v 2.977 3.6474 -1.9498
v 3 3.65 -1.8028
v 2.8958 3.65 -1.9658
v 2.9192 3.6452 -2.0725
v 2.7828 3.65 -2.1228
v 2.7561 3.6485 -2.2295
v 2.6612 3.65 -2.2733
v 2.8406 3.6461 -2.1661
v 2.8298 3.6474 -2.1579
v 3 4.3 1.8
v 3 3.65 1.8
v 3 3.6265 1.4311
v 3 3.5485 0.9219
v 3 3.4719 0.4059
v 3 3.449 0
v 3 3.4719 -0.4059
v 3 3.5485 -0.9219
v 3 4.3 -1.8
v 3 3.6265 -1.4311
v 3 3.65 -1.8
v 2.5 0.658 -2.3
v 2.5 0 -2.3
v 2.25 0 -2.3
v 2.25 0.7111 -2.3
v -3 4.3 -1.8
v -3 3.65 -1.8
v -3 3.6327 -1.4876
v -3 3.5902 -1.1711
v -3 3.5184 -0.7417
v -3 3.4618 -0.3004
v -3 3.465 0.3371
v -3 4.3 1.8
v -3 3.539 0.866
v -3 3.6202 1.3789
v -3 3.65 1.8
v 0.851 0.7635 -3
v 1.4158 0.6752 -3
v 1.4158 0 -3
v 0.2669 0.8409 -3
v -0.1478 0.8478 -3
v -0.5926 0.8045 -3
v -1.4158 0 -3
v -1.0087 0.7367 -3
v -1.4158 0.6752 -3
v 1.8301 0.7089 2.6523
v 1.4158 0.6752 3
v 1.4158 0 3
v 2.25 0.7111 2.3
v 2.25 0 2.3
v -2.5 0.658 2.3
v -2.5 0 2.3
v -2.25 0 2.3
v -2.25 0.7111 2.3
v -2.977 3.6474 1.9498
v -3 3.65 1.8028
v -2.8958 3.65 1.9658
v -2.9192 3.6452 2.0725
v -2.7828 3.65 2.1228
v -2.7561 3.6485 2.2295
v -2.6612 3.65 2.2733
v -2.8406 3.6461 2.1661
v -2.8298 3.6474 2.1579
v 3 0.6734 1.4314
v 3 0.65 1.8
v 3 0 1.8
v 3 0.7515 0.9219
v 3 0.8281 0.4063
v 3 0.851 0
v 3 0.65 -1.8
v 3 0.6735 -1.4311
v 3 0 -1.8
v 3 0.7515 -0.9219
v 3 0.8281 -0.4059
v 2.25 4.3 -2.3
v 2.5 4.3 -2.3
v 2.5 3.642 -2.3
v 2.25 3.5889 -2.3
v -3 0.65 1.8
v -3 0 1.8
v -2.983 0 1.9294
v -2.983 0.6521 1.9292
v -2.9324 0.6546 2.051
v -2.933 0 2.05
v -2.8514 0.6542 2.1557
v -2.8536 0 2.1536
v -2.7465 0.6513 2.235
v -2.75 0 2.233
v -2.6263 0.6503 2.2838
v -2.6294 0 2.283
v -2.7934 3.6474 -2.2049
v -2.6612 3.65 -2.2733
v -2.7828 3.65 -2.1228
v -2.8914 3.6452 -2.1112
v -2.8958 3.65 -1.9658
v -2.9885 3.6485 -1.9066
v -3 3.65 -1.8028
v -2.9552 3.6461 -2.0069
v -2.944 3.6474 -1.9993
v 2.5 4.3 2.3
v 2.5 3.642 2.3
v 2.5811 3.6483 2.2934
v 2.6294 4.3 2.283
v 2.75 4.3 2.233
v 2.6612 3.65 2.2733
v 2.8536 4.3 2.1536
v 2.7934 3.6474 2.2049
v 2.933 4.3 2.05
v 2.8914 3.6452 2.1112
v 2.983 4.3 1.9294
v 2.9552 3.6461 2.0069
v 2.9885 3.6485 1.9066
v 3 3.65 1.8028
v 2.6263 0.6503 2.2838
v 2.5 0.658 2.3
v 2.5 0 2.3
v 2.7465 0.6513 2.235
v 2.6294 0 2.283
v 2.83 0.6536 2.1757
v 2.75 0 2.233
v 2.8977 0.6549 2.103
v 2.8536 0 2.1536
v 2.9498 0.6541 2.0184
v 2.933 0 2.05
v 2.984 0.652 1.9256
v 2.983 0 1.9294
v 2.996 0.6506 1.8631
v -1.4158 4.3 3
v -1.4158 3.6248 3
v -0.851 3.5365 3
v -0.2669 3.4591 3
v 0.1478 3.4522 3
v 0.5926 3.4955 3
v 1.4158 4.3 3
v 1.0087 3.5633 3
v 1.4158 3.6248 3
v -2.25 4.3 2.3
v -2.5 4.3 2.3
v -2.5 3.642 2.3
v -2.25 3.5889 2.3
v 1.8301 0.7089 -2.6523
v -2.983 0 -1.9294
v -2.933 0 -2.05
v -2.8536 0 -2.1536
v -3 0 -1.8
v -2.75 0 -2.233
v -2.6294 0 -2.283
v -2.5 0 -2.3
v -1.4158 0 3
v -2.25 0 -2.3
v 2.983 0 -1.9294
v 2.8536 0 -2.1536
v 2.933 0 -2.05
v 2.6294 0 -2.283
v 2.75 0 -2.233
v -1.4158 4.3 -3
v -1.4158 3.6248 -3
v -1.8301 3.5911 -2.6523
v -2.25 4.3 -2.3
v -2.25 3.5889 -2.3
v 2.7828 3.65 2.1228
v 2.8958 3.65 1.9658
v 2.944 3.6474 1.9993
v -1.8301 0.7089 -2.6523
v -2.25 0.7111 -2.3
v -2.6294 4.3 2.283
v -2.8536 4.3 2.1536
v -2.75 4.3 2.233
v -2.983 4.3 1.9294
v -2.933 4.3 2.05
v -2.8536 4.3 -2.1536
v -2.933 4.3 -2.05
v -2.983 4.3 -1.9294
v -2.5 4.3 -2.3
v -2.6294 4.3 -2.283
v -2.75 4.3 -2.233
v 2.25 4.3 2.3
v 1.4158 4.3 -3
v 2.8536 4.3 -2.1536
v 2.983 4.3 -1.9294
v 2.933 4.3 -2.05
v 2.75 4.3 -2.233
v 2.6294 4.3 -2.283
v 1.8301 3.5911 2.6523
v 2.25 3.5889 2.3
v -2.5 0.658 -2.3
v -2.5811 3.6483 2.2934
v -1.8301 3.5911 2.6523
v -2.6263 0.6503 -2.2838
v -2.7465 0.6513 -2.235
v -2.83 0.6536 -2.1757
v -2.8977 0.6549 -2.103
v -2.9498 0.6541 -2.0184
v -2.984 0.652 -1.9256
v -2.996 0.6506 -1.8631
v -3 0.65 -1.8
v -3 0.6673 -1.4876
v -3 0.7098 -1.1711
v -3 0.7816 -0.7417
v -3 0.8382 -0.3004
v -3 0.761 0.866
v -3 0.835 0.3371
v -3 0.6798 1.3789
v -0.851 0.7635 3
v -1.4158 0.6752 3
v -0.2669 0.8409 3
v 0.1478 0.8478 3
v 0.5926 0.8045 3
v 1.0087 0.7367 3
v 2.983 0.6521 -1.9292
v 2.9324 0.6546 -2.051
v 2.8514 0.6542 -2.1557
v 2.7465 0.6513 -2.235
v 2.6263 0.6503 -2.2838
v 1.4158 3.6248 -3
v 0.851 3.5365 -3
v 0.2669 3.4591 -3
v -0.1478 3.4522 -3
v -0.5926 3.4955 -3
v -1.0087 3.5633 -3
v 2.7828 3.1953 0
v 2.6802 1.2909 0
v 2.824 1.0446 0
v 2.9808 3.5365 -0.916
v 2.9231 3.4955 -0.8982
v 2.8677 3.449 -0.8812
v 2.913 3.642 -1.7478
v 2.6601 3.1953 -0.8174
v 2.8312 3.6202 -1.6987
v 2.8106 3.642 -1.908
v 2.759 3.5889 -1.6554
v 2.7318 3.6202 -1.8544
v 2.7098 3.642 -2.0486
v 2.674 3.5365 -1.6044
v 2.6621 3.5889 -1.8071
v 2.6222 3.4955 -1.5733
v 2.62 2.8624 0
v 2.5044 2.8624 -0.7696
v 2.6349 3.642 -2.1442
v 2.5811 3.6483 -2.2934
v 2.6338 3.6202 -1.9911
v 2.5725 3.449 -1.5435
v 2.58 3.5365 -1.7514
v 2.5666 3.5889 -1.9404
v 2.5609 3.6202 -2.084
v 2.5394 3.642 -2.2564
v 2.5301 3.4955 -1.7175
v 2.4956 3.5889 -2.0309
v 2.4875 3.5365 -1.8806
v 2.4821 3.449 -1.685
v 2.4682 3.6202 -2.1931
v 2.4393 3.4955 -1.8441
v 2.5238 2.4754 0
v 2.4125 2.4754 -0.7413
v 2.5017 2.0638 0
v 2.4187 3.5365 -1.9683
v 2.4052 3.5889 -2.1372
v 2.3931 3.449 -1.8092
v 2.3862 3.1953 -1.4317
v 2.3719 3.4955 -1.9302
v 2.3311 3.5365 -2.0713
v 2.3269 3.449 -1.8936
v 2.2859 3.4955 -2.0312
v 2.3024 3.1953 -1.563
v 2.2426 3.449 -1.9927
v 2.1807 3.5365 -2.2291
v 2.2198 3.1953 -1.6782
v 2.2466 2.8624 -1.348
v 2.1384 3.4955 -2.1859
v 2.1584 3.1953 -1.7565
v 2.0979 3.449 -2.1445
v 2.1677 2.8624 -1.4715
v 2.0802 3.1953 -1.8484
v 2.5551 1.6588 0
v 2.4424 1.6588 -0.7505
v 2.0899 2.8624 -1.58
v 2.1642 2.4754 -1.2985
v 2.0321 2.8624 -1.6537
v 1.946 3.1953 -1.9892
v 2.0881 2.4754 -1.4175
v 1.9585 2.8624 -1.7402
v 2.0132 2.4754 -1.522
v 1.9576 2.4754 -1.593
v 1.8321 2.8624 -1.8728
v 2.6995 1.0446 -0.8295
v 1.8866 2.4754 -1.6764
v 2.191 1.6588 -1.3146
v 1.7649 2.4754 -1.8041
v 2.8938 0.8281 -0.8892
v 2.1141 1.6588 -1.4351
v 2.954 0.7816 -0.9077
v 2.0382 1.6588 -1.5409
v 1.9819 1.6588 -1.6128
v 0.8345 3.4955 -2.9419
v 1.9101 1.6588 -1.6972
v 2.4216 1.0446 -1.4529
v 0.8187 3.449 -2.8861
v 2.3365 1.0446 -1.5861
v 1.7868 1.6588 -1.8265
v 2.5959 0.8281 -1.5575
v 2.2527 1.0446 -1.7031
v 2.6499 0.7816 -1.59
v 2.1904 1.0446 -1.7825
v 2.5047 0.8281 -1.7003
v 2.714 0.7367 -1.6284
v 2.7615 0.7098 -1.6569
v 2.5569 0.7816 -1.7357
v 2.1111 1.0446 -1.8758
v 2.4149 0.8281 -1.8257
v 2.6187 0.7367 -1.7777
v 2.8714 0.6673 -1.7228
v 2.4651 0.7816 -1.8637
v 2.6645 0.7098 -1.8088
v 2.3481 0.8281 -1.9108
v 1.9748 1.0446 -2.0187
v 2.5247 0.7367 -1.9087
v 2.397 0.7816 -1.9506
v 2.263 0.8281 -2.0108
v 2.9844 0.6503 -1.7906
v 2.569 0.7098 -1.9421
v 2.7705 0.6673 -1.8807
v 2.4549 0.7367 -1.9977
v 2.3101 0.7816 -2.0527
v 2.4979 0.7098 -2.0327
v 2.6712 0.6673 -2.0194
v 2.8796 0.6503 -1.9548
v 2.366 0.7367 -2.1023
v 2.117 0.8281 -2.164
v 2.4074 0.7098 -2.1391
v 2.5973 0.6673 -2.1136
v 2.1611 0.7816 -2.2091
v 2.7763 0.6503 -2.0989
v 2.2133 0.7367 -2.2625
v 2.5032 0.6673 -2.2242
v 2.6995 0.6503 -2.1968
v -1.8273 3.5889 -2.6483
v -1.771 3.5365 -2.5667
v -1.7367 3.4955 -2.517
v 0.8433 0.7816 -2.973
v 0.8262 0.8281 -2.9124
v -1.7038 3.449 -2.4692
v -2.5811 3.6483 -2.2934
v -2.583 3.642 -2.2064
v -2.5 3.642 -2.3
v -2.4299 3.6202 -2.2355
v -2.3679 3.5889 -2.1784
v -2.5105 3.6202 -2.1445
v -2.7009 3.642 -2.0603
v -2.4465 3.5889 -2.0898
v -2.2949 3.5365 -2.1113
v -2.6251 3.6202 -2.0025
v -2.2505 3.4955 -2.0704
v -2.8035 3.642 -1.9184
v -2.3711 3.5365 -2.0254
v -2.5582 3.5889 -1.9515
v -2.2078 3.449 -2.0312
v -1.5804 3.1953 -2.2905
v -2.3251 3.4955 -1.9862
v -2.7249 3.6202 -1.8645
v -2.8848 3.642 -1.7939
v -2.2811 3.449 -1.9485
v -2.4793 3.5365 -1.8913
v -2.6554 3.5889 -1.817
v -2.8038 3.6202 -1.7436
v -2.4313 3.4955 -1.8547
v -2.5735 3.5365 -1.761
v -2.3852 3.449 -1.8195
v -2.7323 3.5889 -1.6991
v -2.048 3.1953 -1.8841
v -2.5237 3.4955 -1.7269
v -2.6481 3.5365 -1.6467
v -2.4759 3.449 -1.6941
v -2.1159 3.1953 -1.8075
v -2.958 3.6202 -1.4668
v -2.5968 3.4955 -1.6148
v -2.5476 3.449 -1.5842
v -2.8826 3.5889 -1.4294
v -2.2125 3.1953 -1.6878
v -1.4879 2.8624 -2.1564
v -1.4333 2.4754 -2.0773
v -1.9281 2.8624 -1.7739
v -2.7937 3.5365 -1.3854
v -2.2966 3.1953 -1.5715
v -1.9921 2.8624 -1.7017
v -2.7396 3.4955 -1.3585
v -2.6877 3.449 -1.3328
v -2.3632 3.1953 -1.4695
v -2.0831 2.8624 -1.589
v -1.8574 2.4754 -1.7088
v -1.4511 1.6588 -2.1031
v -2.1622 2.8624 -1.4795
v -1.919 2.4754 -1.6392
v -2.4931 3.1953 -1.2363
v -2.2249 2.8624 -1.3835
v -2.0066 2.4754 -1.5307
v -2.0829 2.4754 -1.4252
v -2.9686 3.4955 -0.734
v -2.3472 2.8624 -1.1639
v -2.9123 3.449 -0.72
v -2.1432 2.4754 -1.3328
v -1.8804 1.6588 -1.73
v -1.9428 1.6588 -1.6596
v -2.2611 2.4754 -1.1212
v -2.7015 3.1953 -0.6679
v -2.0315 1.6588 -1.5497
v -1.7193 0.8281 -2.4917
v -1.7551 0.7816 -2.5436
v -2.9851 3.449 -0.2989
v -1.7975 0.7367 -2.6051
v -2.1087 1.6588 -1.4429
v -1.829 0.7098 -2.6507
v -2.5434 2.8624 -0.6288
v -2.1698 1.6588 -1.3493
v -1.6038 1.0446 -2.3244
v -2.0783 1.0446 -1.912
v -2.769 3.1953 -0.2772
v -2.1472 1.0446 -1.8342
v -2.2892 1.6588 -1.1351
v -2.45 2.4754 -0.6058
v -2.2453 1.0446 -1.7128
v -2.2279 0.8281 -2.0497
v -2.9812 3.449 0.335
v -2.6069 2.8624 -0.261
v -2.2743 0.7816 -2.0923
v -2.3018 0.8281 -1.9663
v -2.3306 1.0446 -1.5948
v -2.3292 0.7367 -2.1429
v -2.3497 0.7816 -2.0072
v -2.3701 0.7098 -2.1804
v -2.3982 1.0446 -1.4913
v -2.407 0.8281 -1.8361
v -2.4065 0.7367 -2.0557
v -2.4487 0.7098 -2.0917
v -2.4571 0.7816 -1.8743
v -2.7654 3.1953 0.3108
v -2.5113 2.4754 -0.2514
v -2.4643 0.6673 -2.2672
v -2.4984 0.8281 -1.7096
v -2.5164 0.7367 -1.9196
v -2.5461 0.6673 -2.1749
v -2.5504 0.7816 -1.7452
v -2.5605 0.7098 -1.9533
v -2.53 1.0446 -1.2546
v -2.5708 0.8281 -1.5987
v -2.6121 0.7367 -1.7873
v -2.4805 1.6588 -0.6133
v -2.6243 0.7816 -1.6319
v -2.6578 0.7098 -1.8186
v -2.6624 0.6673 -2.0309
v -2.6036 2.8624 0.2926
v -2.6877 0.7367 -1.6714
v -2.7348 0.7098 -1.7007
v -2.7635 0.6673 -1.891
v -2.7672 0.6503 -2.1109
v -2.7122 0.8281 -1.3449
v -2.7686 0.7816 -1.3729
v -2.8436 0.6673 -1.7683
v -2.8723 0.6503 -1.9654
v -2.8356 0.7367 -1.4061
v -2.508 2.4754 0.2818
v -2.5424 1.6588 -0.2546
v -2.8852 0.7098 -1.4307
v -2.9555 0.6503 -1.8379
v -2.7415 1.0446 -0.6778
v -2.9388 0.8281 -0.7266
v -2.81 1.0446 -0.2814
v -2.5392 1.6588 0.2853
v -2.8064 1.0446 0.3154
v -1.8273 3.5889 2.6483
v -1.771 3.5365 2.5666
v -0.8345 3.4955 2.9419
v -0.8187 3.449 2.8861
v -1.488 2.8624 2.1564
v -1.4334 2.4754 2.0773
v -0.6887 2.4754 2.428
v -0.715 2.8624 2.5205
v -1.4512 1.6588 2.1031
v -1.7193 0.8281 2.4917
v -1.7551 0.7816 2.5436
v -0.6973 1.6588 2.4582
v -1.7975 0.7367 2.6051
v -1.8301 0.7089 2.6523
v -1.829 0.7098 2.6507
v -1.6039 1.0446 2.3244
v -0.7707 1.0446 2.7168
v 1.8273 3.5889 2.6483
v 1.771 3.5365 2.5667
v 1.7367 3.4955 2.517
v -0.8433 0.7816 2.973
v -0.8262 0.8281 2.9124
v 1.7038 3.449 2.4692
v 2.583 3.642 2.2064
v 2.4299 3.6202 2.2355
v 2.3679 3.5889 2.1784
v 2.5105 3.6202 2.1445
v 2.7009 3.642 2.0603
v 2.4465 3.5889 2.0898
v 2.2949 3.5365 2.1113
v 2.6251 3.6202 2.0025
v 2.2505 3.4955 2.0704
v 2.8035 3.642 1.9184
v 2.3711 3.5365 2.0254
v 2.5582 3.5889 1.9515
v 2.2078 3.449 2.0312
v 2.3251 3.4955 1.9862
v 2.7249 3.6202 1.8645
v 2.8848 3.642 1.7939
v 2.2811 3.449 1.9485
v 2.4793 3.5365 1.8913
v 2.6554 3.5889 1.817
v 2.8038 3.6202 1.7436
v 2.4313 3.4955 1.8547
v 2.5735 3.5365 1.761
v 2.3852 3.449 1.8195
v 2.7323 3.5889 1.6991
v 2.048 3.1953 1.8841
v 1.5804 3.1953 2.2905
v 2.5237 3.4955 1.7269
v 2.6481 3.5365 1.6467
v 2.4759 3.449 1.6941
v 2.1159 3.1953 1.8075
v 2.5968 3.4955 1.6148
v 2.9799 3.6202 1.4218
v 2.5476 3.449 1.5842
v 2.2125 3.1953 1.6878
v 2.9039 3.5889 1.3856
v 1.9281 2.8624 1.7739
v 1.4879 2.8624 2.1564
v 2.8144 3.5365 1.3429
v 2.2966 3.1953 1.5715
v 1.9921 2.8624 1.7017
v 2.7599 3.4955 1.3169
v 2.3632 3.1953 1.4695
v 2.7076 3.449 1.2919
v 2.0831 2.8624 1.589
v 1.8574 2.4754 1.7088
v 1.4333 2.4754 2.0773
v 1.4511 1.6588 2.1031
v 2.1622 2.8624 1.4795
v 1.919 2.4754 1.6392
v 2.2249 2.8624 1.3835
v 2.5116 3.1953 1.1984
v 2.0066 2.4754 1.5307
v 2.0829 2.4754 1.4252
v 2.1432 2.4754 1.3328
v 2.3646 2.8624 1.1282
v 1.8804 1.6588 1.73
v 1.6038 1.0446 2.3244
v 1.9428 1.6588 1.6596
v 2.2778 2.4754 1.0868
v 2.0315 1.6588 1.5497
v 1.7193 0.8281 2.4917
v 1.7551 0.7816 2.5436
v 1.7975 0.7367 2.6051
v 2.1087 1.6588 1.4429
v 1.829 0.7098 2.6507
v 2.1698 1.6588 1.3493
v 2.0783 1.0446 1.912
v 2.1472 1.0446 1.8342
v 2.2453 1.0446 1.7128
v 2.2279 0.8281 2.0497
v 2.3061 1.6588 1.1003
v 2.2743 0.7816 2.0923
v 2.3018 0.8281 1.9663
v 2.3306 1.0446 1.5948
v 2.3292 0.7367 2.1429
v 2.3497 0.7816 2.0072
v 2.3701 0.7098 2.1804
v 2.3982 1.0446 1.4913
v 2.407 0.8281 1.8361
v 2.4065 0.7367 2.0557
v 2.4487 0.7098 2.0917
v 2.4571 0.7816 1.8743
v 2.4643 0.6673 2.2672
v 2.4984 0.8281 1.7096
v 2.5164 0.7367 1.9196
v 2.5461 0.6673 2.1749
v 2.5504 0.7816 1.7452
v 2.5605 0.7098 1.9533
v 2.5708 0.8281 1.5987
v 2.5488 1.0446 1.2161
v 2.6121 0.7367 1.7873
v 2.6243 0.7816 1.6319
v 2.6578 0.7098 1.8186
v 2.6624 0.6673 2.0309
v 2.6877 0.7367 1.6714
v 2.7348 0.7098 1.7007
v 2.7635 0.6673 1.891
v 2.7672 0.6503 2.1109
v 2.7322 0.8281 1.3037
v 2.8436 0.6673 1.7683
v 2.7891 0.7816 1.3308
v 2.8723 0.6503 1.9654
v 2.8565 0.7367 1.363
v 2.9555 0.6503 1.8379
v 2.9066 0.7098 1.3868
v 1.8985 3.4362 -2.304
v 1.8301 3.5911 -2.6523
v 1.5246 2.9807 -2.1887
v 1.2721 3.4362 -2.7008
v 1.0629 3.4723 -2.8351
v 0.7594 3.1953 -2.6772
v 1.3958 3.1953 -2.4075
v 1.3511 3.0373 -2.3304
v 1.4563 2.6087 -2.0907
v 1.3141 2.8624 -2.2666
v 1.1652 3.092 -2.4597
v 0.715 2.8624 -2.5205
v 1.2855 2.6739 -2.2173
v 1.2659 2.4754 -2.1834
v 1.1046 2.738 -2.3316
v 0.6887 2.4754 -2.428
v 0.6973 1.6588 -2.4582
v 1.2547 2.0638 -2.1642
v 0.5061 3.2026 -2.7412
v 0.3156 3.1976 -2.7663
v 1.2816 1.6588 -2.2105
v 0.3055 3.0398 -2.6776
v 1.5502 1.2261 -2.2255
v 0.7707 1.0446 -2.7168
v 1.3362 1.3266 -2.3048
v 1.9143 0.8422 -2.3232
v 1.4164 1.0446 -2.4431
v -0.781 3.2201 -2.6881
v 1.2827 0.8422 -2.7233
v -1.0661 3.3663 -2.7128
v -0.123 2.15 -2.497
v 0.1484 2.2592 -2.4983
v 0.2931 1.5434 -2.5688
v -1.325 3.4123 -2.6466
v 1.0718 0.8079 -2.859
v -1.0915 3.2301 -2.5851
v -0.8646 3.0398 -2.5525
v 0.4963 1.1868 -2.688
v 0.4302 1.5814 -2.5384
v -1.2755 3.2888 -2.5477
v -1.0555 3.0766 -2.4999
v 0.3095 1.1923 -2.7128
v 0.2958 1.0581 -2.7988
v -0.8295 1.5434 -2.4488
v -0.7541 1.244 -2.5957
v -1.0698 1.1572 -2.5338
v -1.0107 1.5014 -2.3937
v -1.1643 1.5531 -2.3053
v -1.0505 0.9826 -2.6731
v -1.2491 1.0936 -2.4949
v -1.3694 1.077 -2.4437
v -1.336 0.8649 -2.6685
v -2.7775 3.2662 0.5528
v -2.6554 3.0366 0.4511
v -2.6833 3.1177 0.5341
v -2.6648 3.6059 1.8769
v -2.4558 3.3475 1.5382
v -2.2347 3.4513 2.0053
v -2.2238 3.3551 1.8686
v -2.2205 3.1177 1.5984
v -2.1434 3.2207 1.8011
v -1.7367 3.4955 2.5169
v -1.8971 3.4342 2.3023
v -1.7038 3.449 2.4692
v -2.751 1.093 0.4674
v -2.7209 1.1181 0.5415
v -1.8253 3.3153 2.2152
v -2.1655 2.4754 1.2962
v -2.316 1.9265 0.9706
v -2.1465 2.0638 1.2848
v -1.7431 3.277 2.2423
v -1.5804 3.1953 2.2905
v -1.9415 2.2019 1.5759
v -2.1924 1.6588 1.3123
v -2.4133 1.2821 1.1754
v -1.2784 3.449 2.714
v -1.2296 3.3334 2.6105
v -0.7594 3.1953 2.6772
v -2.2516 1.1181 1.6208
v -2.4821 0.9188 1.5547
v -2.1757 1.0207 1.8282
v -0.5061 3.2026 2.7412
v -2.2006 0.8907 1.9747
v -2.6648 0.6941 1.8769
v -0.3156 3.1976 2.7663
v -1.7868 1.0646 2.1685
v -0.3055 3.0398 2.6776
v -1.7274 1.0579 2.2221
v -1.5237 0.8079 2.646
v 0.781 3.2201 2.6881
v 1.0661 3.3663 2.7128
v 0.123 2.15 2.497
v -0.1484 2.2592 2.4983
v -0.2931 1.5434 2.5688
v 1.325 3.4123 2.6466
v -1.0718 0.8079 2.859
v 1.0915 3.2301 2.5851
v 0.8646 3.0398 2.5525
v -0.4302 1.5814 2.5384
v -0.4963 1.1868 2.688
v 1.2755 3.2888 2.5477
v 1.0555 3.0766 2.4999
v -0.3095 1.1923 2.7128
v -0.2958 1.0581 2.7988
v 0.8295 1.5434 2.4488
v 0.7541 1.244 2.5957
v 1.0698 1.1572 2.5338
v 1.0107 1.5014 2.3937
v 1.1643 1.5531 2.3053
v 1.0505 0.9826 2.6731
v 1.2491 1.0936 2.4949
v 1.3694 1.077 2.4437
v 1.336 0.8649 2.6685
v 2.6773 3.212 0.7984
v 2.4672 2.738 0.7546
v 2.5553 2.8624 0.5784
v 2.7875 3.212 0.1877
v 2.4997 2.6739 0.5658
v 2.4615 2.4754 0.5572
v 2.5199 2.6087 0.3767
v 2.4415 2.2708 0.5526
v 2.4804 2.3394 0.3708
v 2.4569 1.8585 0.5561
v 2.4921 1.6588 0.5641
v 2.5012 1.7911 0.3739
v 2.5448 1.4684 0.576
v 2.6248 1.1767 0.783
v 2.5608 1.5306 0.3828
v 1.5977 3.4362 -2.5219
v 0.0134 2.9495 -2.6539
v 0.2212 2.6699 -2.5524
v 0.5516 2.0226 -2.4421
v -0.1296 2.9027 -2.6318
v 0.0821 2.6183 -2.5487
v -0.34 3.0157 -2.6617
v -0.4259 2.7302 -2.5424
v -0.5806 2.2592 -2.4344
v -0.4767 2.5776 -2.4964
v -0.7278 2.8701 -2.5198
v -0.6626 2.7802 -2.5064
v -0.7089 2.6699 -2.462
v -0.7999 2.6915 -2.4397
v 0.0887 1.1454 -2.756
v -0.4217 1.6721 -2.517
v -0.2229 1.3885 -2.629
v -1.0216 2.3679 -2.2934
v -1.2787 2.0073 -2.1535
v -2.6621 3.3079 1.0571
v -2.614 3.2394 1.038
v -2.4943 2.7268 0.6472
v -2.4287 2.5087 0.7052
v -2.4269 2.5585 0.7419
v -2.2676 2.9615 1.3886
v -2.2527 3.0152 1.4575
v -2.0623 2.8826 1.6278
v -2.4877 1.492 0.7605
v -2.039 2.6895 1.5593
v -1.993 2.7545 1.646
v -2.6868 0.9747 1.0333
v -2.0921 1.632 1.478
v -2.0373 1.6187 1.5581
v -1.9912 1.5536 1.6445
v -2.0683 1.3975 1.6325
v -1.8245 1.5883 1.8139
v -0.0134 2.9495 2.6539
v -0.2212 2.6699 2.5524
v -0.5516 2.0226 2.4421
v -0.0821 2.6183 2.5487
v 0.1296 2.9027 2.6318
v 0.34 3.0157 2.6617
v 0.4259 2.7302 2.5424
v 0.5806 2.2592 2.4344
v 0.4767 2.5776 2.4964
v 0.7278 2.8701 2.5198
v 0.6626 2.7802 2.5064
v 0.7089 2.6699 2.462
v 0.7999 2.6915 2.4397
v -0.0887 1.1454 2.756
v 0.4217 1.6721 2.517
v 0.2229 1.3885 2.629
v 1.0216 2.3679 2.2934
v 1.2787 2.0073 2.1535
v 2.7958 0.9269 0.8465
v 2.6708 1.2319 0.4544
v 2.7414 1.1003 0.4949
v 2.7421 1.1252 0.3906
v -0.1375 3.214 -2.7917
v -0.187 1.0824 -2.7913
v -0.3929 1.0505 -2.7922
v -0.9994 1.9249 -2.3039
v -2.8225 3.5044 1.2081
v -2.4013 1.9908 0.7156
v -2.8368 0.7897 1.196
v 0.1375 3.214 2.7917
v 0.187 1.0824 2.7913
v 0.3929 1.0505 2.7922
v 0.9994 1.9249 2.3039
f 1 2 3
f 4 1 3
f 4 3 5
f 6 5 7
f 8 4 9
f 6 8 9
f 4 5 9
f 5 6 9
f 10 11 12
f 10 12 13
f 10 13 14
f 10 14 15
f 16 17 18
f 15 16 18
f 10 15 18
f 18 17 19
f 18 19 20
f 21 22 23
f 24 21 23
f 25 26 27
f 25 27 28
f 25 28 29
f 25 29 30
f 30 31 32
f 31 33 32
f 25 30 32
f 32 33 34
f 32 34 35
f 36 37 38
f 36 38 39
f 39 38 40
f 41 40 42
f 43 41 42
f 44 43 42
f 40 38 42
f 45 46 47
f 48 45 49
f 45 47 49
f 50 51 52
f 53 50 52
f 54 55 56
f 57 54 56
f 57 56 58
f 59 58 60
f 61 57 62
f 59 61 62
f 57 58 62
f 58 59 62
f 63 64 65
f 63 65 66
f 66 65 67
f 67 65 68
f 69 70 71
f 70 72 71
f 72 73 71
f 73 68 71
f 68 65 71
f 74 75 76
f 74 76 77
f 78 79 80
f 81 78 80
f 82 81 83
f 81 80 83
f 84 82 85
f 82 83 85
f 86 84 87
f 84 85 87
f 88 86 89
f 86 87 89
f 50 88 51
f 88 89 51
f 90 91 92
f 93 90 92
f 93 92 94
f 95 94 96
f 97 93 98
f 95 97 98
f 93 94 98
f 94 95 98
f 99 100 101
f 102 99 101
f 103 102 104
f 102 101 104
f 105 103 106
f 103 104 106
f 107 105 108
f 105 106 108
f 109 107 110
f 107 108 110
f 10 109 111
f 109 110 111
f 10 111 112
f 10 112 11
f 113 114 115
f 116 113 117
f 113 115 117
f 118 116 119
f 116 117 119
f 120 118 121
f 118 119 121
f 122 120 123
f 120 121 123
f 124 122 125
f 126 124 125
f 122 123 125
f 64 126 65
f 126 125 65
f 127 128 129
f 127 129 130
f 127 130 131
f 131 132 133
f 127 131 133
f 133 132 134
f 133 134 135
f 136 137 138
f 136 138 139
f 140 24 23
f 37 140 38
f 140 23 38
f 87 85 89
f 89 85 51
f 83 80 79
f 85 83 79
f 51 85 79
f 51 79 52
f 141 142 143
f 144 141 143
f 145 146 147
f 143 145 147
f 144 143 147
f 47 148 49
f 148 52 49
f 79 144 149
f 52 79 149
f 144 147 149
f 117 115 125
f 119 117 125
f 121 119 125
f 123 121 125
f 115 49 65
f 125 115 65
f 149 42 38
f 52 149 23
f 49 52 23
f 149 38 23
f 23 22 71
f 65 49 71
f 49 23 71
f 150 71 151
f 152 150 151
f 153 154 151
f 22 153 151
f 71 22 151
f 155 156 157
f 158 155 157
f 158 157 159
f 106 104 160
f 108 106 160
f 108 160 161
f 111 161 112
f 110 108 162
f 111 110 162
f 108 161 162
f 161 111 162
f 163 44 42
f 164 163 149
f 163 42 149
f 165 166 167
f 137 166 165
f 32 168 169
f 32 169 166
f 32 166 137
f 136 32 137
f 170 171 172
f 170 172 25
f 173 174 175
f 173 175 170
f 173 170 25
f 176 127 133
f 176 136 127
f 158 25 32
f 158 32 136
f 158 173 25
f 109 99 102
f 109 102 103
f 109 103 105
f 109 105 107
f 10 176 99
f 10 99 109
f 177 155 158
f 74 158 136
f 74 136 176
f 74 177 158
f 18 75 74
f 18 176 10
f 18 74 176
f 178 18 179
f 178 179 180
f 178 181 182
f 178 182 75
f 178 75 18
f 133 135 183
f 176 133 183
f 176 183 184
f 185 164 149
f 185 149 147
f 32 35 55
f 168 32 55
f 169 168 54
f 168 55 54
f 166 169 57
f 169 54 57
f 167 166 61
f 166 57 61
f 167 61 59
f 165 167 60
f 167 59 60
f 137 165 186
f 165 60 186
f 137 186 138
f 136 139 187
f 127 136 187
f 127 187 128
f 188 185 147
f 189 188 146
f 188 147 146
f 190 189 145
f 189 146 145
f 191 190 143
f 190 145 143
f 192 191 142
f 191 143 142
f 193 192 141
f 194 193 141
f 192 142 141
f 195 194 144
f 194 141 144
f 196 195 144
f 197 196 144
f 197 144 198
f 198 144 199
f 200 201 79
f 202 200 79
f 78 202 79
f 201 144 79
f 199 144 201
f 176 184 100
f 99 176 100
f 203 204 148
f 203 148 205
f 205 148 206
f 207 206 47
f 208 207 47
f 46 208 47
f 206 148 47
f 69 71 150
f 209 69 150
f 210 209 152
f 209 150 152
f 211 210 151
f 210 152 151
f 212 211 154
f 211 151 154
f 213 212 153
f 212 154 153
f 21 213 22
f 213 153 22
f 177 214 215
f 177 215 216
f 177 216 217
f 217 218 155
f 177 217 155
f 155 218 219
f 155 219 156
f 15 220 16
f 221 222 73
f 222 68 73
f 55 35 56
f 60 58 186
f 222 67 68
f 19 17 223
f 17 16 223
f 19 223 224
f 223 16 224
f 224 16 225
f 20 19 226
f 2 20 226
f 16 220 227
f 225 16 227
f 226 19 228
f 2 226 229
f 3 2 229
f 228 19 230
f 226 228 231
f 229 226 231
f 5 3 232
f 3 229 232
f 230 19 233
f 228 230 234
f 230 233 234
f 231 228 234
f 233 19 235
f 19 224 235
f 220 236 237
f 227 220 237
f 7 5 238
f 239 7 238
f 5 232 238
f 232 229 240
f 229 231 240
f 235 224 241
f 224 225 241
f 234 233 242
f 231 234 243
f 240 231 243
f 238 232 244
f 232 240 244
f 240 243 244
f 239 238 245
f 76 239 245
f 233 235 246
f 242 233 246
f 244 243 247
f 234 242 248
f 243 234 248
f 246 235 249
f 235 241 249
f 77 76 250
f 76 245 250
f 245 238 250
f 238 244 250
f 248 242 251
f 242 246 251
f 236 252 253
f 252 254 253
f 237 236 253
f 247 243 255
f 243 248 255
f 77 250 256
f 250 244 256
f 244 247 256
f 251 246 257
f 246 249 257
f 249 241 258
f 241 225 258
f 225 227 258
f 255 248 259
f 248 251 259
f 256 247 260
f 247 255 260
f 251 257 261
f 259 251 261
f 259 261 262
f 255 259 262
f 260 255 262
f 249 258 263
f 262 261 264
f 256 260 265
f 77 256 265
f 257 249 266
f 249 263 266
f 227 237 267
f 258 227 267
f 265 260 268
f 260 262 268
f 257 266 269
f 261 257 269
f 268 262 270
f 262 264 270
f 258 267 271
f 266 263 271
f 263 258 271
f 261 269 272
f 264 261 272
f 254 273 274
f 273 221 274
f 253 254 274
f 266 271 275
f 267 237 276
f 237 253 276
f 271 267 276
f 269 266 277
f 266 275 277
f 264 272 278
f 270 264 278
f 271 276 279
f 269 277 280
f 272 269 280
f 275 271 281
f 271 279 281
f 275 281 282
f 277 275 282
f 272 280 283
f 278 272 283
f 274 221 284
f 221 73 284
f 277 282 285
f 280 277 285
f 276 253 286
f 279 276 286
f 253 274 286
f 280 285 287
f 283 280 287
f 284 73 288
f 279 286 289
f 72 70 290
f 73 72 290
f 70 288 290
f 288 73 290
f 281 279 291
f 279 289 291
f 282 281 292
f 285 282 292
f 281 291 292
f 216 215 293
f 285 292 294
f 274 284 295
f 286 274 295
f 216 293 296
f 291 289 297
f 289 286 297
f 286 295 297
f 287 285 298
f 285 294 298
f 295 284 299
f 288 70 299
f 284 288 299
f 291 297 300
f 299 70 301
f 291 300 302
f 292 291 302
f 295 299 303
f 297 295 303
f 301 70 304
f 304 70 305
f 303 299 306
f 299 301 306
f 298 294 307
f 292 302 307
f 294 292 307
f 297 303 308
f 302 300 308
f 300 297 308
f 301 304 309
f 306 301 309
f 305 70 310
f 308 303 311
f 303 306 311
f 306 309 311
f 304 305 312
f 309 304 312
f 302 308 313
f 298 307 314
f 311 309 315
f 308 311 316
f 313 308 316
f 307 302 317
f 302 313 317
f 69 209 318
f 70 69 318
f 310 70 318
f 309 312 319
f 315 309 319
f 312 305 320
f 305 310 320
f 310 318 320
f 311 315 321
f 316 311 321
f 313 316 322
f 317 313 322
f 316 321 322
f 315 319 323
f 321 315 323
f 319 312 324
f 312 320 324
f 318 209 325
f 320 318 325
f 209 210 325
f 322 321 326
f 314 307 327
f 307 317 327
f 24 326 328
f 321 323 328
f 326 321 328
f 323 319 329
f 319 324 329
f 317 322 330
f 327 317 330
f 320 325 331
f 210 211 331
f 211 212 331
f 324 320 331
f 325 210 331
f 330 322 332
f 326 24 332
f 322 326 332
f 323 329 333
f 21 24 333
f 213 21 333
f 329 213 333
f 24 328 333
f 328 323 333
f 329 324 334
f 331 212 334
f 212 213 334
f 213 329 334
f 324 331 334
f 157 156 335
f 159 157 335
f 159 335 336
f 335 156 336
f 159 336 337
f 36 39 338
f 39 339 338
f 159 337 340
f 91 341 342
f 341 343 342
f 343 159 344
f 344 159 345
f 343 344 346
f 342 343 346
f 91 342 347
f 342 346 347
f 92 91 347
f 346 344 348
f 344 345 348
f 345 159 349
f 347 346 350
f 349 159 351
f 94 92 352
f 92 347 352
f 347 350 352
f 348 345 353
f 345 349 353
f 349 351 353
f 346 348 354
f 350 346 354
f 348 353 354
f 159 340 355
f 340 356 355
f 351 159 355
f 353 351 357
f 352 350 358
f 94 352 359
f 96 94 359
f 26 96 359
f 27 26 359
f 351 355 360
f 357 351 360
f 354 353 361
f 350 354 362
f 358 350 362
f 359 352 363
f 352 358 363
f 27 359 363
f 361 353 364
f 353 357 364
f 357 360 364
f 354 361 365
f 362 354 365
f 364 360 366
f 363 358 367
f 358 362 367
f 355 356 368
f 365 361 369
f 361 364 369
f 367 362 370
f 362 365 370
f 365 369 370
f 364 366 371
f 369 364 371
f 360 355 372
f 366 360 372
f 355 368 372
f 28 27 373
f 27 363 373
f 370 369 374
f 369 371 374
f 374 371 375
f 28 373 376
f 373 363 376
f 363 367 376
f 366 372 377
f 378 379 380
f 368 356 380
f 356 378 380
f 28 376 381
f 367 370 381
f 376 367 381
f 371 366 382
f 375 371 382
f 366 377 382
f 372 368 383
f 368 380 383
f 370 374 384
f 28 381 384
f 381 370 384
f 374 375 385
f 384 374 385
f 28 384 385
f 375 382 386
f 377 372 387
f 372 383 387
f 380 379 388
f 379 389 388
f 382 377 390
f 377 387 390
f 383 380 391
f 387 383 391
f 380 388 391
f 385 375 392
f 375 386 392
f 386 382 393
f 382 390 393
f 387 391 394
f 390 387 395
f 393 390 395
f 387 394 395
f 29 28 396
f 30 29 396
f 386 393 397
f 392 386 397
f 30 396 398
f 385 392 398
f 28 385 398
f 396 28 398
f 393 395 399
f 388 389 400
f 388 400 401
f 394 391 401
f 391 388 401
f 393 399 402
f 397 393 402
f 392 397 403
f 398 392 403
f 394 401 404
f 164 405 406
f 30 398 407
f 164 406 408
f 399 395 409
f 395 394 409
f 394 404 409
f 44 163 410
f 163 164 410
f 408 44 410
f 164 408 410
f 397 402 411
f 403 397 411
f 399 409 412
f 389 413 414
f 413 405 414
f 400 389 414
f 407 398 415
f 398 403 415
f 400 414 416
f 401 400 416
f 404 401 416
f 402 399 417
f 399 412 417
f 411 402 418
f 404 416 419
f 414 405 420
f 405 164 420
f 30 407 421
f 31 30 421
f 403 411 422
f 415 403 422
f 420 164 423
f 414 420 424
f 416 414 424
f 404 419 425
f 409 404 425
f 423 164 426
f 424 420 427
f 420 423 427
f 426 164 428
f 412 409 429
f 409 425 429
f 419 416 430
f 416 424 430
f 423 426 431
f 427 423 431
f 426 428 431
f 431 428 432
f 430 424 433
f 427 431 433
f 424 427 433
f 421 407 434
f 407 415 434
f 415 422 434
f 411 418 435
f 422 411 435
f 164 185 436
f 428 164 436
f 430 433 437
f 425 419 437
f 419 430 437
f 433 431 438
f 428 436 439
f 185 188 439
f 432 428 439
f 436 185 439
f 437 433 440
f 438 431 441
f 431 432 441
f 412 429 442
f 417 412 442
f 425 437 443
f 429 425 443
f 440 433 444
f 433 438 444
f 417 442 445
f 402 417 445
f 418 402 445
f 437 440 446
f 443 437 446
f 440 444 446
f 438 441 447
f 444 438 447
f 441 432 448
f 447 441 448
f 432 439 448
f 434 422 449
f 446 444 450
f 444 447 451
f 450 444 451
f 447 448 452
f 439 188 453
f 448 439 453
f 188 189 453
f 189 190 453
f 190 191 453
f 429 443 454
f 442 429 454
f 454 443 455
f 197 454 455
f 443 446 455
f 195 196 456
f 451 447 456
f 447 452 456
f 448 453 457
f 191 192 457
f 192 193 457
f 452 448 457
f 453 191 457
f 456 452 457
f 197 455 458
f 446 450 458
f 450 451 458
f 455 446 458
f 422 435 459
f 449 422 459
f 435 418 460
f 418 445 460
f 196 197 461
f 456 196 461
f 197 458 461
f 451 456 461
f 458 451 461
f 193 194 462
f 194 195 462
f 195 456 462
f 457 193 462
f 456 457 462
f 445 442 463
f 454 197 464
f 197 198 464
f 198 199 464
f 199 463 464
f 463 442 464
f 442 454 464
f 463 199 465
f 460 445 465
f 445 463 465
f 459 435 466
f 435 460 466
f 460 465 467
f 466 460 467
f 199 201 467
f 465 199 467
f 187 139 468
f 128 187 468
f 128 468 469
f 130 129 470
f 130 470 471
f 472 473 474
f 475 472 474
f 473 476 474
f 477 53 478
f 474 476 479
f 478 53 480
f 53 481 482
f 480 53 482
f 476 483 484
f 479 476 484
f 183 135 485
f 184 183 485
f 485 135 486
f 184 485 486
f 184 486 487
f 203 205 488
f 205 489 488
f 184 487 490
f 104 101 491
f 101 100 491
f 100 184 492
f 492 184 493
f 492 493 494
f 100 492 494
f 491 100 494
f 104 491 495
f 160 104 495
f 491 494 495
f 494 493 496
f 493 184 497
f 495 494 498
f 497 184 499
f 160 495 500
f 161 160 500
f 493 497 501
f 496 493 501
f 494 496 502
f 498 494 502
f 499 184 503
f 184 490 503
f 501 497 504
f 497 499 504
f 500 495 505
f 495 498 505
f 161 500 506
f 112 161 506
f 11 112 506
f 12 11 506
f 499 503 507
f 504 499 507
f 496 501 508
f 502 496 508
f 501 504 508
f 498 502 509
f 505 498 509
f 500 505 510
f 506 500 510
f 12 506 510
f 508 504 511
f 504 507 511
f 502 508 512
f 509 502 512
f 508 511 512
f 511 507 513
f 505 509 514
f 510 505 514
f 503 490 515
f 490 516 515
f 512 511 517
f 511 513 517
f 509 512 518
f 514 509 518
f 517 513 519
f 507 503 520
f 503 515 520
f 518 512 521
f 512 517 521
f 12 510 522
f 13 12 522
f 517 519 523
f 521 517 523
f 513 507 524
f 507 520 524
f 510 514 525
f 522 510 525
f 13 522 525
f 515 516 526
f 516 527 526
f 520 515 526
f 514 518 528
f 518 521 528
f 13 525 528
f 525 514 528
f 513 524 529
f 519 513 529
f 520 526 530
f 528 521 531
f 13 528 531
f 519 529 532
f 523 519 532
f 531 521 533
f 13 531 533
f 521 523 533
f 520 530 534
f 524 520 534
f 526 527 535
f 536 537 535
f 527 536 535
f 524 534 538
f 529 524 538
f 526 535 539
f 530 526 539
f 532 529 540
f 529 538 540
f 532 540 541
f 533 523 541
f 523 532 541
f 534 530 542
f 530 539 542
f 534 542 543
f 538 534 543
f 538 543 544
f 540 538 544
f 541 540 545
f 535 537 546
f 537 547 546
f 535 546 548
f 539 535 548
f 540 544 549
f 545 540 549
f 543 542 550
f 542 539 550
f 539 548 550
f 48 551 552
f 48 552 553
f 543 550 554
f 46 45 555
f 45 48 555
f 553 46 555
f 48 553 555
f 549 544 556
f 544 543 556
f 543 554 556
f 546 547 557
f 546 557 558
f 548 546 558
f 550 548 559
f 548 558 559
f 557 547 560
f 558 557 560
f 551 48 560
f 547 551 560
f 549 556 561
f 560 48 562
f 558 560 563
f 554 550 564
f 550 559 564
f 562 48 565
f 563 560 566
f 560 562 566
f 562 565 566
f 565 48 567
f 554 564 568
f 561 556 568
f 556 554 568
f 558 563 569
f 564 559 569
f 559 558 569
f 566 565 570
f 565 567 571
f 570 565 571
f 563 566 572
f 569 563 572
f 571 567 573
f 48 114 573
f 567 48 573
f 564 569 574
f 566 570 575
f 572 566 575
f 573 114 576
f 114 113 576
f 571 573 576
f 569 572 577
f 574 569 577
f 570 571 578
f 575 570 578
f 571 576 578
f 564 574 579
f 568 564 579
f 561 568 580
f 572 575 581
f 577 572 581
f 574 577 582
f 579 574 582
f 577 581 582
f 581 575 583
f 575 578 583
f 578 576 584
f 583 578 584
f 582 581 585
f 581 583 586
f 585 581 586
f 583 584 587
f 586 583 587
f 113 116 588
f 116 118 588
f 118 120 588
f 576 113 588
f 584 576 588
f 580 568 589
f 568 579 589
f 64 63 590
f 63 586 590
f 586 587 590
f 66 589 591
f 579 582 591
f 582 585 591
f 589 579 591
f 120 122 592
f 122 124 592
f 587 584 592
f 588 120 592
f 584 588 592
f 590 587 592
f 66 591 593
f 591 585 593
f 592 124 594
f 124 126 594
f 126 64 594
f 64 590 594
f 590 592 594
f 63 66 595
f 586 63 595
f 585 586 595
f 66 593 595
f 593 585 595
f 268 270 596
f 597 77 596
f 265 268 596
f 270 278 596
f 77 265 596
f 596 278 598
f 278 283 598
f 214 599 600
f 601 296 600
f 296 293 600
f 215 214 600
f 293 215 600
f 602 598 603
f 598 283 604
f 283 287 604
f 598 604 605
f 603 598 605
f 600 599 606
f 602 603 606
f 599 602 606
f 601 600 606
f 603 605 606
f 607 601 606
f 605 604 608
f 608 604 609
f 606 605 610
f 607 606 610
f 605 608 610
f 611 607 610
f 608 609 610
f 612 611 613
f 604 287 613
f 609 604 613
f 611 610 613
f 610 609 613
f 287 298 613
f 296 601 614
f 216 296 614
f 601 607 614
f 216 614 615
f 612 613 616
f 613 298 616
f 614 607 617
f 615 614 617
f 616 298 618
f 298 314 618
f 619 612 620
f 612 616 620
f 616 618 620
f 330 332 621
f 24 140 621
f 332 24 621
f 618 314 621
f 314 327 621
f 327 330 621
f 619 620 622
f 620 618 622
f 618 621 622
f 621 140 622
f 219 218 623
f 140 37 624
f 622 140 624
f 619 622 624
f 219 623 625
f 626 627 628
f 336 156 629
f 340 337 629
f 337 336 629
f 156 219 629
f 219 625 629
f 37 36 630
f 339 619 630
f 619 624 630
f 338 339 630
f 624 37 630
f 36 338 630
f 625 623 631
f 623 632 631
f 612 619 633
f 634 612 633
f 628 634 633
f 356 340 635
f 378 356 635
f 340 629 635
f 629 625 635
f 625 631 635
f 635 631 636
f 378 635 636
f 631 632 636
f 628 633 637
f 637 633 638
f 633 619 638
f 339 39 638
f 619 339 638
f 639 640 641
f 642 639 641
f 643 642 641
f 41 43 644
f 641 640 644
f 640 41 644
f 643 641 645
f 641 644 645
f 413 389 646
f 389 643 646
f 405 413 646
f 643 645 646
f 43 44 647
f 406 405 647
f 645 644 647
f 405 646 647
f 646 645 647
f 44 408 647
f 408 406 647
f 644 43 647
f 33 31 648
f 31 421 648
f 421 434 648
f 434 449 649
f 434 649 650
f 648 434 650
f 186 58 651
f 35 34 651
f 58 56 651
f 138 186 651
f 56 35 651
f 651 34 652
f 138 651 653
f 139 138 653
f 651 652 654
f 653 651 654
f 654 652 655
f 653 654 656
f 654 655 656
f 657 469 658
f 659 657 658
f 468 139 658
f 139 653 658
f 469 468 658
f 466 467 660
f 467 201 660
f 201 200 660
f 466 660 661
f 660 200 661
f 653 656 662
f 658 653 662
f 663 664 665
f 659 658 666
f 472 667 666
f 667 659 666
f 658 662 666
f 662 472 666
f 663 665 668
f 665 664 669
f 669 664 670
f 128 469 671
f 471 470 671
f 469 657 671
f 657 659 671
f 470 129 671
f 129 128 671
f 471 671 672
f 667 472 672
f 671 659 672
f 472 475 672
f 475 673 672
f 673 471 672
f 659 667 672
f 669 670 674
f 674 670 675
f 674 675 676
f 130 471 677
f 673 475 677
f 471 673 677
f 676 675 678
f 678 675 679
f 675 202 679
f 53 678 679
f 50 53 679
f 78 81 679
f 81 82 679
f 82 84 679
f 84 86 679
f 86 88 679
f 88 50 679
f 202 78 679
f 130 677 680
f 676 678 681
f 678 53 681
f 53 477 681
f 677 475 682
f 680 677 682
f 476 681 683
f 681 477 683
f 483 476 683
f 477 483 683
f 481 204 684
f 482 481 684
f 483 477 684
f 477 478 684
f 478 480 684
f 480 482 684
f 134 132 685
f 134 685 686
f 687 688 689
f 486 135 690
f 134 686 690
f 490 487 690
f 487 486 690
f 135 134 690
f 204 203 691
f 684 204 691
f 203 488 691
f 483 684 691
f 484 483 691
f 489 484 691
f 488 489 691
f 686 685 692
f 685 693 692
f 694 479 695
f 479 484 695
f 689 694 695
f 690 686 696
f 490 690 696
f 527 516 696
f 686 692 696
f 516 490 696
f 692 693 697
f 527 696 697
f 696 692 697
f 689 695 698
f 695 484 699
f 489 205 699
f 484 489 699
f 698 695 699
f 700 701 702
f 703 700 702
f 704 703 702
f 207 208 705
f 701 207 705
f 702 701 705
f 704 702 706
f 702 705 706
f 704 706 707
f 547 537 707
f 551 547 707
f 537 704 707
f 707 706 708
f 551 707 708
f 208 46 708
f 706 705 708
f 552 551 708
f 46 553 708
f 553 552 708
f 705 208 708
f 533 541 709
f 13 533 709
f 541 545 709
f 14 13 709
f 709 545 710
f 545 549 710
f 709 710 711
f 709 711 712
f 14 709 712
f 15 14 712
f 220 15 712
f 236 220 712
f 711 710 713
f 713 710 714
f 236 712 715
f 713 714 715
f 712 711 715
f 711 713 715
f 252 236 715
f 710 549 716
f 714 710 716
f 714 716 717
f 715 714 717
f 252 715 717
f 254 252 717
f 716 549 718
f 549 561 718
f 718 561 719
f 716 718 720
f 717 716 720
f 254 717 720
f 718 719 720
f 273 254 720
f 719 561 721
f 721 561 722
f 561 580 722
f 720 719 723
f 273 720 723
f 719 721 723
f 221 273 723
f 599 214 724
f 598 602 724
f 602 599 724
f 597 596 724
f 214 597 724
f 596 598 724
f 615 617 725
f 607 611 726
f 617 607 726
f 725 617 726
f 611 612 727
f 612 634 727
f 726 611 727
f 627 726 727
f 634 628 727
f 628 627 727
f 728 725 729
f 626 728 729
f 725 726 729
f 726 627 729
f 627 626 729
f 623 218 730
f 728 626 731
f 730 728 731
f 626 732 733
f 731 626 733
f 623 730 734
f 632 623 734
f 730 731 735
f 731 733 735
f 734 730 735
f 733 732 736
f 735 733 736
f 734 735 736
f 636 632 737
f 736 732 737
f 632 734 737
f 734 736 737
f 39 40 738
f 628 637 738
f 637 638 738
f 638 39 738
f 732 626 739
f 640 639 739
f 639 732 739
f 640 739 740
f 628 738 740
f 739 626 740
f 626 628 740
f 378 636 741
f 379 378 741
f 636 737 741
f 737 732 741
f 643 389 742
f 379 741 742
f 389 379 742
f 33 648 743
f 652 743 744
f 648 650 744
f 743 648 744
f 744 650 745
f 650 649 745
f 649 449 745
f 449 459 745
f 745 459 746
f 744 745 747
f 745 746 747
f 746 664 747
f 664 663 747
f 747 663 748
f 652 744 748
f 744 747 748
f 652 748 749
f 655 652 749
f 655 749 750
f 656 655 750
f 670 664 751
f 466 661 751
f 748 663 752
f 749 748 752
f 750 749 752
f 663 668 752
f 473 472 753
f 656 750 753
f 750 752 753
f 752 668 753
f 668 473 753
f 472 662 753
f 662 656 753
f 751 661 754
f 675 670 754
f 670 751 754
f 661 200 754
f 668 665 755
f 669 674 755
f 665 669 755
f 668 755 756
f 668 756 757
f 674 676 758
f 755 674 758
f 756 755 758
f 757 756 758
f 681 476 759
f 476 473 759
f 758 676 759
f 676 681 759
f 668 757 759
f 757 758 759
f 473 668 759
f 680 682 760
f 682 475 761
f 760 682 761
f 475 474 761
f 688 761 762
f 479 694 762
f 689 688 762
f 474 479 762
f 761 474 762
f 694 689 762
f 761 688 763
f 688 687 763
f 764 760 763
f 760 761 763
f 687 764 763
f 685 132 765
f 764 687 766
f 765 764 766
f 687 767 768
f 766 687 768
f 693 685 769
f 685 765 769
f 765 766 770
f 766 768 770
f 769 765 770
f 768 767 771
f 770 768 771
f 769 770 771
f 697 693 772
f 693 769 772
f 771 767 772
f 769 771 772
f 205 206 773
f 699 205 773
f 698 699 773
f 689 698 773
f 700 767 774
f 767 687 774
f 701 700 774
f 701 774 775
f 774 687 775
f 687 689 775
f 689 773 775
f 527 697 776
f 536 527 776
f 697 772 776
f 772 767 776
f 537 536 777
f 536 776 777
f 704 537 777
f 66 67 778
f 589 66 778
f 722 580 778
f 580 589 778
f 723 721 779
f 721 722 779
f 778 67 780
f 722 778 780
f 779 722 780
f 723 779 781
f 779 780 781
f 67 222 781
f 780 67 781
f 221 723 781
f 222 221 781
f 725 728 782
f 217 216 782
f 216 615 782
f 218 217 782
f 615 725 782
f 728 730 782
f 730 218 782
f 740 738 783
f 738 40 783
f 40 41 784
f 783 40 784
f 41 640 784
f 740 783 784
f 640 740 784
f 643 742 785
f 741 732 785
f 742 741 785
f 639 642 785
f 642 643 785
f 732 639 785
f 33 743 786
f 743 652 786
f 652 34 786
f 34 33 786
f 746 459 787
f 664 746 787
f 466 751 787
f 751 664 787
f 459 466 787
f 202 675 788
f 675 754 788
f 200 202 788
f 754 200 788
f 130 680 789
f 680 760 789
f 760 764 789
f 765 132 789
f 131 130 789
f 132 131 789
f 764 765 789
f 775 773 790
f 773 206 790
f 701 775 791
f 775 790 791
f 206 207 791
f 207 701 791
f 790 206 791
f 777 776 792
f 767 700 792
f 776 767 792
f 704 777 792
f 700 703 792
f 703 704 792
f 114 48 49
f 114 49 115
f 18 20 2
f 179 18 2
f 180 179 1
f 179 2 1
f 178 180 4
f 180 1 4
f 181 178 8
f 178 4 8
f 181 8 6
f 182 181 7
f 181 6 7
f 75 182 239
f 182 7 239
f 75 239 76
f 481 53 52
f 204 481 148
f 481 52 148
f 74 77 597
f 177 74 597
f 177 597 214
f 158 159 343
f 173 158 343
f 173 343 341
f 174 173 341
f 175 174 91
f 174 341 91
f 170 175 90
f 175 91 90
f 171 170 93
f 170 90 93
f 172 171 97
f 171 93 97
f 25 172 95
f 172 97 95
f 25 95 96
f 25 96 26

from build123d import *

# Parameters (mm, degrees)
BOSS_EXTRUDE1_DEPTH = 4.3
SKETCH2_RX          = 1.5
SKETCH2_RY          = 1


with BuildPart() as part:
    # Sketch1 → Boss-Extrude1 (new body)
    with BuildSketch(Plane(origin=(0, 0, 0), x_dir=(1, 0, 0), z_dir=(0, 1, 0))):
        with BuildLine():
            Line((-1.415772485, -3), (1.415772485, -3))
            Line((1.415772485, -3), (2.25, -2.3))
            Line((2.25, -2.3), (2.5, -2.3))
            ThreePointArc((2.5, -2.3), (2.853553391, -2.153553391), (3, -1.8))
            Line((3, -1.8), (3, 1.8))
            ThreePointArc((3, 1.8), (2.853553391, 2.153553391), (2.5, 2.3))
            Line((2.5, 2.3), (2.25, 2.3))
            Line((2.25, 2.3), (1.415772485, 3))
            Line((1.415772485, 3), (-1.415772485, 3))
            Line((-1.415772485, 3), (-2.25, 2.3))
            Line((-2.25, 2.3), (-2.5, 2.3))
            ThreePointArc((-2.5, 2.3), (-2.853553391, 2.153553391), (-3, 1.8))
            Line((-3, 1.8), (-3, -1.8))
            ThreePointArc((-3, -1.8), (-2.853553391, -2.153553391), (-2.5, -2.3))
            Line((-2.5, -2.3), (-2.25, -2.3))
            Line((-2.25, -2.3), (-1.415772485, -3))
        make_face()
    extrude(amount=BOSS_EXTRUDE1_DEPTH)

    # Sketch2 → Cut-Revolve1 (revolve, cut)
    with BuildSketch(Plane.XY):
        with Locations(Location((3.5, 2.15), (0, 0, 90))):
            Ellipse(SKETCH2_RX, SKETCH2_RY)
    revolve(axis=Axis((0, 0, 0), (0, 1, 0)), mode=Mode.SUBTRACT)


solid = part.part
